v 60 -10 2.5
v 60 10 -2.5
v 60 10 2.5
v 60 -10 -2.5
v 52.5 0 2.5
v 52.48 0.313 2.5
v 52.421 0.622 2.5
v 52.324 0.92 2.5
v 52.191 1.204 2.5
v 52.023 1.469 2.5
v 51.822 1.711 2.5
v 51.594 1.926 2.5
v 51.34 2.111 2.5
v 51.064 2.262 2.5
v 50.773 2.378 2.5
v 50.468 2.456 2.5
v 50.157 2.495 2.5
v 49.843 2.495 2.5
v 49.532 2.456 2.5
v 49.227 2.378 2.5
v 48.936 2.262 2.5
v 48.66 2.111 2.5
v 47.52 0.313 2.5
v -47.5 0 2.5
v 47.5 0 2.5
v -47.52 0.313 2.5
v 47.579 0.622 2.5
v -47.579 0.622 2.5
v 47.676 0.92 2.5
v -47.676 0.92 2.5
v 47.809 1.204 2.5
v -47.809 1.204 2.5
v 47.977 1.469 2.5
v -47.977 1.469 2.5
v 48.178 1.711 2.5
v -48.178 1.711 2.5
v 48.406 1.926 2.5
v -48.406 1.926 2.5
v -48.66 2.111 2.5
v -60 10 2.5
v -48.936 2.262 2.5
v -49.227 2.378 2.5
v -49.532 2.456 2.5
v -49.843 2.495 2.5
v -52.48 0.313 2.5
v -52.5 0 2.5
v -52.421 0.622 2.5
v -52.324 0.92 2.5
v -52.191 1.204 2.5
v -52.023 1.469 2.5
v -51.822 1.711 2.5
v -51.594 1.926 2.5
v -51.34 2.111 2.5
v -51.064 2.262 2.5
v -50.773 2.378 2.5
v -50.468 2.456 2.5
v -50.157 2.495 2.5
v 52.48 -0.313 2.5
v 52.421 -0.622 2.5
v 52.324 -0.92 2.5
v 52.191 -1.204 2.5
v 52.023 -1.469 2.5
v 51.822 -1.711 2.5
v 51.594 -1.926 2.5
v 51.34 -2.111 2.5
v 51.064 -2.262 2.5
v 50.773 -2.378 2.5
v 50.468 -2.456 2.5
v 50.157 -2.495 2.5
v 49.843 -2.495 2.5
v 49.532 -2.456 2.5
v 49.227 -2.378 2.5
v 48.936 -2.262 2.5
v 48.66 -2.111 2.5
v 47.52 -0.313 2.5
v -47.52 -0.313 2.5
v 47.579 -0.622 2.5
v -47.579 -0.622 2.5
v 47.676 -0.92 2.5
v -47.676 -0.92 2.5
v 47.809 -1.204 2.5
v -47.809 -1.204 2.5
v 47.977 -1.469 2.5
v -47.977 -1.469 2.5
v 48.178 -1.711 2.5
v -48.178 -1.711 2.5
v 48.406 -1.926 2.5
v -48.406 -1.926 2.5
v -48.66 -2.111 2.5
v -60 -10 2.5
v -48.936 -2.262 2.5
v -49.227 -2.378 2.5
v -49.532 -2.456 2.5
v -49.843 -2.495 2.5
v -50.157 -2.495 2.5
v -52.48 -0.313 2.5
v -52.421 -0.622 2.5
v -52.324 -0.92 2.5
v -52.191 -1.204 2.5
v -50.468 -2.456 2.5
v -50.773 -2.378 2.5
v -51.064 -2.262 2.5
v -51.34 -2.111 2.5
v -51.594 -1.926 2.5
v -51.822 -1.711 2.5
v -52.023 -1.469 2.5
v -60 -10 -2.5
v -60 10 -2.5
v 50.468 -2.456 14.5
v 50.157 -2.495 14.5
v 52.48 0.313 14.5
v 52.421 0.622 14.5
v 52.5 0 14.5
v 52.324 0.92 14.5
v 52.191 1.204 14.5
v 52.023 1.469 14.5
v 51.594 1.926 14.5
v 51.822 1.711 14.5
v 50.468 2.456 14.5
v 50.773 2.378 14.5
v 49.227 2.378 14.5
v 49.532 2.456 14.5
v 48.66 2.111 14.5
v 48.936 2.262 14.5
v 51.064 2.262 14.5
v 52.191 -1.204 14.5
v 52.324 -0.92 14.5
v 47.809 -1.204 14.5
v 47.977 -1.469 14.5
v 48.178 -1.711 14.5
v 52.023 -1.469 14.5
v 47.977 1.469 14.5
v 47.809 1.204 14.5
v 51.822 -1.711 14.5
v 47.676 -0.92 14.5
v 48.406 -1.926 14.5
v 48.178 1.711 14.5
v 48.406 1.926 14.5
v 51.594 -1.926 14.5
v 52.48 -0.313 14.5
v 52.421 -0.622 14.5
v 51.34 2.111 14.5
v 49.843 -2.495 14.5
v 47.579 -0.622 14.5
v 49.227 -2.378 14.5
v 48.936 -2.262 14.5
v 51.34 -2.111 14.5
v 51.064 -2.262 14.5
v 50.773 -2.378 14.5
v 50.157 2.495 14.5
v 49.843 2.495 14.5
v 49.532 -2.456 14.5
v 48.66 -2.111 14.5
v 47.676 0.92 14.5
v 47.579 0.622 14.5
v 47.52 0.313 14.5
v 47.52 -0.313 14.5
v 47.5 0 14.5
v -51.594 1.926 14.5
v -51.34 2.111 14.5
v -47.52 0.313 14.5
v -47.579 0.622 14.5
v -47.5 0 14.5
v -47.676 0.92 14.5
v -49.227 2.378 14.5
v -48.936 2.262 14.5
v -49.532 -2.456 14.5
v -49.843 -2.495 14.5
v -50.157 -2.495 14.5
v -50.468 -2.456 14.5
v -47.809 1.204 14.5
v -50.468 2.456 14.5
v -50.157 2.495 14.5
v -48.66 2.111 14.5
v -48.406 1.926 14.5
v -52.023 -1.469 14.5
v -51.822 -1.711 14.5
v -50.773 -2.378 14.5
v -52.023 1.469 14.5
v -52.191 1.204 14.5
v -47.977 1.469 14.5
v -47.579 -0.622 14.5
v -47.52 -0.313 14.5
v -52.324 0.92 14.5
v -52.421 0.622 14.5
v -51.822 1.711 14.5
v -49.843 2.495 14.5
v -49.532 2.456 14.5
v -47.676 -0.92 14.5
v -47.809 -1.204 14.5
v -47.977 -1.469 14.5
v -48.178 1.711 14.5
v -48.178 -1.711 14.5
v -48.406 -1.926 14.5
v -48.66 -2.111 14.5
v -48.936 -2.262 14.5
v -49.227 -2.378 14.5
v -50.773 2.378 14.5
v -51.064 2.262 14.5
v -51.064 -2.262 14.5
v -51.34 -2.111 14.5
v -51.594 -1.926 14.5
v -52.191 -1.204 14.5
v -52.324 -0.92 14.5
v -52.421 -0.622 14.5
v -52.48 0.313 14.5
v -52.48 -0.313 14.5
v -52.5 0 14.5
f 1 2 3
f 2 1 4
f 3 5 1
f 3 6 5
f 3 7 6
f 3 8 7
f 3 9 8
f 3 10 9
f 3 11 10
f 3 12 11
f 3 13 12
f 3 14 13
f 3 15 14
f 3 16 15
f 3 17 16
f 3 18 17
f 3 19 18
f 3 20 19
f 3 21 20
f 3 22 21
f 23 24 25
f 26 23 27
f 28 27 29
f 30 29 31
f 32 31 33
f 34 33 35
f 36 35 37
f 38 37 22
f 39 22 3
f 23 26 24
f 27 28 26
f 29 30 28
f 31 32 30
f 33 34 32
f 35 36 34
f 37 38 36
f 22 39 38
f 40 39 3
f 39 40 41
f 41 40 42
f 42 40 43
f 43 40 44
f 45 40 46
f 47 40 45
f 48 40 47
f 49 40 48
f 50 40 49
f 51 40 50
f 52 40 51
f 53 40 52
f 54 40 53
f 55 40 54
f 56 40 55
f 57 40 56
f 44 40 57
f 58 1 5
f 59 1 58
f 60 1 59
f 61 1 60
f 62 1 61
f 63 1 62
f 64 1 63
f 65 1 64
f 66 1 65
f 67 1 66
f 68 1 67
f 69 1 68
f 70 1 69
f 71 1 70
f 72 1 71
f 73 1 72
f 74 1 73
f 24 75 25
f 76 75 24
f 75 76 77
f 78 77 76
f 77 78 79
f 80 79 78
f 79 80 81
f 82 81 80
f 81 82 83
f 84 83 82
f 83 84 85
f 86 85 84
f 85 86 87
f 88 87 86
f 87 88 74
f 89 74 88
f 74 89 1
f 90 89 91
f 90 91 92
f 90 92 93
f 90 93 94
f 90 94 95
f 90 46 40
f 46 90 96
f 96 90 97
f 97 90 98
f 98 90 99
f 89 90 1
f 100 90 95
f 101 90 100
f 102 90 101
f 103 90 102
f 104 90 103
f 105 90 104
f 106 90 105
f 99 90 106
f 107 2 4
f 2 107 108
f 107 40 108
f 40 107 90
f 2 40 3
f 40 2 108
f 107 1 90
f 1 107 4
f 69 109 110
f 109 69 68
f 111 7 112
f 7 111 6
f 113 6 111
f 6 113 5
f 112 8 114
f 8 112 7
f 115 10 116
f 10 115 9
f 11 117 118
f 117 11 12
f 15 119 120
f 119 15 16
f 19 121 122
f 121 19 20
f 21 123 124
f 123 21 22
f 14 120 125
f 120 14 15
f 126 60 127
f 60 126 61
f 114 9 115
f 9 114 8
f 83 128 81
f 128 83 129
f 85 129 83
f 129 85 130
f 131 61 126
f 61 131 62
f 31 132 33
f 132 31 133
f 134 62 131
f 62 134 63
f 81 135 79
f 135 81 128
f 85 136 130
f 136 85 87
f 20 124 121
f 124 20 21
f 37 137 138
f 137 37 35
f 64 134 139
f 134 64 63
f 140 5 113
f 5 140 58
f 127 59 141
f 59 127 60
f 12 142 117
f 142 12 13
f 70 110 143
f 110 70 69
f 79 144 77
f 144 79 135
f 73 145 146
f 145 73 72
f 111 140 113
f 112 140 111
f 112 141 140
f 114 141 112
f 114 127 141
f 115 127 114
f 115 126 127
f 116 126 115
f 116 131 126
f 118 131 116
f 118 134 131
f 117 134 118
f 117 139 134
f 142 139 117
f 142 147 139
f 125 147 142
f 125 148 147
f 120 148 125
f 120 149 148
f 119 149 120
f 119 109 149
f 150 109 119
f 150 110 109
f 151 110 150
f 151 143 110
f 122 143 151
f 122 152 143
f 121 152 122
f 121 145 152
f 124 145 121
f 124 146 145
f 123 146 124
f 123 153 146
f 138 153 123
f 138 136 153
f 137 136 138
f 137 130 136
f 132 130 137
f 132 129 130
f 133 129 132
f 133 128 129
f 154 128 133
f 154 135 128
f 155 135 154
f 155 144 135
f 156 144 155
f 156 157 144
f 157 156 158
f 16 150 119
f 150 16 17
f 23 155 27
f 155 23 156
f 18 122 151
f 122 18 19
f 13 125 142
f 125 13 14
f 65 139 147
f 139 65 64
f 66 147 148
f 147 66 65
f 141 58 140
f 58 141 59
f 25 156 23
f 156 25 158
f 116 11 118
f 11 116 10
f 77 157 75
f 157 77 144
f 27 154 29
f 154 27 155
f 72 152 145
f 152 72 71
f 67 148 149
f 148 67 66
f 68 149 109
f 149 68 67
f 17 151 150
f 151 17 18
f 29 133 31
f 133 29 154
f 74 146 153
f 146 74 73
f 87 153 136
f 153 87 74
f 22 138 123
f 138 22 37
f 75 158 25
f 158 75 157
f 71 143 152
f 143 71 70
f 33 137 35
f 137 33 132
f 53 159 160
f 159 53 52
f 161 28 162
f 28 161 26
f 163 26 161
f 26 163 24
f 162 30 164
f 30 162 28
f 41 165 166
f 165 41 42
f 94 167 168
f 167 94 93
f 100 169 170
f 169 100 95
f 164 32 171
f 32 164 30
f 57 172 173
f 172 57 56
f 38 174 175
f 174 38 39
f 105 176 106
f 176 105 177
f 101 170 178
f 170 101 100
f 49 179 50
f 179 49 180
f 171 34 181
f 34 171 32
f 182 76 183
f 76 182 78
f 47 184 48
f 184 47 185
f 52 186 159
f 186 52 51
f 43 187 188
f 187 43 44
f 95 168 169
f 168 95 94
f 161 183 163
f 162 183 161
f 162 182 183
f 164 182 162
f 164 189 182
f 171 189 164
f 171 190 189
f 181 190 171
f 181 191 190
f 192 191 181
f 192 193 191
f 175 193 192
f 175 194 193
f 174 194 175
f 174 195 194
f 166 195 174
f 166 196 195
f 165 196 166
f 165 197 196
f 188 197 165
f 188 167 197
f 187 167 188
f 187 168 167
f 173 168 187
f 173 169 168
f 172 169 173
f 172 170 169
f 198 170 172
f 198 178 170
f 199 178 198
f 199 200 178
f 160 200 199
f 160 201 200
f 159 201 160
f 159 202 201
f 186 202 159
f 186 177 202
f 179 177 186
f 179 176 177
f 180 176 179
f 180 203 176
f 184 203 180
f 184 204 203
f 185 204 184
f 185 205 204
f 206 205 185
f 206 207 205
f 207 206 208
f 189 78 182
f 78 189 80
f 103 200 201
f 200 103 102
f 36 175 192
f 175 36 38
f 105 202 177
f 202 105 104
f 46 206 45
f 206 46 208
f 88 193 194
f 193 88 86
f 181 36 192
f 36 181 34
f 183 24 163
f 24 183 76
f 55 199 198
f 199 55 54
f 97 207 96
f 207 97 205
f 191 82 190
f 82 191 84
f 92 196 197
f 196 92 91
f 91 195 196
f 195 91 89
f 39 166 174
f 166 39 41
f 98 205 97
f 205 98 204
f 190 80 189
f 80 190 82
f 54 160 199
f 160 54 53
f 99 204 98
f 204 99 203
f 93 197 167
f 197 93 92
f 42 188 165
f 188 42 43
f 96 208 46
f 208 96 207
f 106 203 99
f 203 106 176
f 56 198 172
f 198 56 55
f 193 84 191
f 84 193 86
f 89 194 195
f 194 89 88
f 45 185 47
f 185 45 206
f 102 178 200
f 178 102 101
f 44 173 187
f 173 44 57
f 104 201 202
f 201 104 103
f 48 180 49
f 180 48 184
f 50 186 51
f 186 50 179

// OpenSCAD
$fn = 50;
cube([120, 20, 5], center = true);
translate([50, 0, 2.5]) cylinder(d=5, h=12);
translate([-50, 0, 2.5]) cylinder(d=5, h=12);
